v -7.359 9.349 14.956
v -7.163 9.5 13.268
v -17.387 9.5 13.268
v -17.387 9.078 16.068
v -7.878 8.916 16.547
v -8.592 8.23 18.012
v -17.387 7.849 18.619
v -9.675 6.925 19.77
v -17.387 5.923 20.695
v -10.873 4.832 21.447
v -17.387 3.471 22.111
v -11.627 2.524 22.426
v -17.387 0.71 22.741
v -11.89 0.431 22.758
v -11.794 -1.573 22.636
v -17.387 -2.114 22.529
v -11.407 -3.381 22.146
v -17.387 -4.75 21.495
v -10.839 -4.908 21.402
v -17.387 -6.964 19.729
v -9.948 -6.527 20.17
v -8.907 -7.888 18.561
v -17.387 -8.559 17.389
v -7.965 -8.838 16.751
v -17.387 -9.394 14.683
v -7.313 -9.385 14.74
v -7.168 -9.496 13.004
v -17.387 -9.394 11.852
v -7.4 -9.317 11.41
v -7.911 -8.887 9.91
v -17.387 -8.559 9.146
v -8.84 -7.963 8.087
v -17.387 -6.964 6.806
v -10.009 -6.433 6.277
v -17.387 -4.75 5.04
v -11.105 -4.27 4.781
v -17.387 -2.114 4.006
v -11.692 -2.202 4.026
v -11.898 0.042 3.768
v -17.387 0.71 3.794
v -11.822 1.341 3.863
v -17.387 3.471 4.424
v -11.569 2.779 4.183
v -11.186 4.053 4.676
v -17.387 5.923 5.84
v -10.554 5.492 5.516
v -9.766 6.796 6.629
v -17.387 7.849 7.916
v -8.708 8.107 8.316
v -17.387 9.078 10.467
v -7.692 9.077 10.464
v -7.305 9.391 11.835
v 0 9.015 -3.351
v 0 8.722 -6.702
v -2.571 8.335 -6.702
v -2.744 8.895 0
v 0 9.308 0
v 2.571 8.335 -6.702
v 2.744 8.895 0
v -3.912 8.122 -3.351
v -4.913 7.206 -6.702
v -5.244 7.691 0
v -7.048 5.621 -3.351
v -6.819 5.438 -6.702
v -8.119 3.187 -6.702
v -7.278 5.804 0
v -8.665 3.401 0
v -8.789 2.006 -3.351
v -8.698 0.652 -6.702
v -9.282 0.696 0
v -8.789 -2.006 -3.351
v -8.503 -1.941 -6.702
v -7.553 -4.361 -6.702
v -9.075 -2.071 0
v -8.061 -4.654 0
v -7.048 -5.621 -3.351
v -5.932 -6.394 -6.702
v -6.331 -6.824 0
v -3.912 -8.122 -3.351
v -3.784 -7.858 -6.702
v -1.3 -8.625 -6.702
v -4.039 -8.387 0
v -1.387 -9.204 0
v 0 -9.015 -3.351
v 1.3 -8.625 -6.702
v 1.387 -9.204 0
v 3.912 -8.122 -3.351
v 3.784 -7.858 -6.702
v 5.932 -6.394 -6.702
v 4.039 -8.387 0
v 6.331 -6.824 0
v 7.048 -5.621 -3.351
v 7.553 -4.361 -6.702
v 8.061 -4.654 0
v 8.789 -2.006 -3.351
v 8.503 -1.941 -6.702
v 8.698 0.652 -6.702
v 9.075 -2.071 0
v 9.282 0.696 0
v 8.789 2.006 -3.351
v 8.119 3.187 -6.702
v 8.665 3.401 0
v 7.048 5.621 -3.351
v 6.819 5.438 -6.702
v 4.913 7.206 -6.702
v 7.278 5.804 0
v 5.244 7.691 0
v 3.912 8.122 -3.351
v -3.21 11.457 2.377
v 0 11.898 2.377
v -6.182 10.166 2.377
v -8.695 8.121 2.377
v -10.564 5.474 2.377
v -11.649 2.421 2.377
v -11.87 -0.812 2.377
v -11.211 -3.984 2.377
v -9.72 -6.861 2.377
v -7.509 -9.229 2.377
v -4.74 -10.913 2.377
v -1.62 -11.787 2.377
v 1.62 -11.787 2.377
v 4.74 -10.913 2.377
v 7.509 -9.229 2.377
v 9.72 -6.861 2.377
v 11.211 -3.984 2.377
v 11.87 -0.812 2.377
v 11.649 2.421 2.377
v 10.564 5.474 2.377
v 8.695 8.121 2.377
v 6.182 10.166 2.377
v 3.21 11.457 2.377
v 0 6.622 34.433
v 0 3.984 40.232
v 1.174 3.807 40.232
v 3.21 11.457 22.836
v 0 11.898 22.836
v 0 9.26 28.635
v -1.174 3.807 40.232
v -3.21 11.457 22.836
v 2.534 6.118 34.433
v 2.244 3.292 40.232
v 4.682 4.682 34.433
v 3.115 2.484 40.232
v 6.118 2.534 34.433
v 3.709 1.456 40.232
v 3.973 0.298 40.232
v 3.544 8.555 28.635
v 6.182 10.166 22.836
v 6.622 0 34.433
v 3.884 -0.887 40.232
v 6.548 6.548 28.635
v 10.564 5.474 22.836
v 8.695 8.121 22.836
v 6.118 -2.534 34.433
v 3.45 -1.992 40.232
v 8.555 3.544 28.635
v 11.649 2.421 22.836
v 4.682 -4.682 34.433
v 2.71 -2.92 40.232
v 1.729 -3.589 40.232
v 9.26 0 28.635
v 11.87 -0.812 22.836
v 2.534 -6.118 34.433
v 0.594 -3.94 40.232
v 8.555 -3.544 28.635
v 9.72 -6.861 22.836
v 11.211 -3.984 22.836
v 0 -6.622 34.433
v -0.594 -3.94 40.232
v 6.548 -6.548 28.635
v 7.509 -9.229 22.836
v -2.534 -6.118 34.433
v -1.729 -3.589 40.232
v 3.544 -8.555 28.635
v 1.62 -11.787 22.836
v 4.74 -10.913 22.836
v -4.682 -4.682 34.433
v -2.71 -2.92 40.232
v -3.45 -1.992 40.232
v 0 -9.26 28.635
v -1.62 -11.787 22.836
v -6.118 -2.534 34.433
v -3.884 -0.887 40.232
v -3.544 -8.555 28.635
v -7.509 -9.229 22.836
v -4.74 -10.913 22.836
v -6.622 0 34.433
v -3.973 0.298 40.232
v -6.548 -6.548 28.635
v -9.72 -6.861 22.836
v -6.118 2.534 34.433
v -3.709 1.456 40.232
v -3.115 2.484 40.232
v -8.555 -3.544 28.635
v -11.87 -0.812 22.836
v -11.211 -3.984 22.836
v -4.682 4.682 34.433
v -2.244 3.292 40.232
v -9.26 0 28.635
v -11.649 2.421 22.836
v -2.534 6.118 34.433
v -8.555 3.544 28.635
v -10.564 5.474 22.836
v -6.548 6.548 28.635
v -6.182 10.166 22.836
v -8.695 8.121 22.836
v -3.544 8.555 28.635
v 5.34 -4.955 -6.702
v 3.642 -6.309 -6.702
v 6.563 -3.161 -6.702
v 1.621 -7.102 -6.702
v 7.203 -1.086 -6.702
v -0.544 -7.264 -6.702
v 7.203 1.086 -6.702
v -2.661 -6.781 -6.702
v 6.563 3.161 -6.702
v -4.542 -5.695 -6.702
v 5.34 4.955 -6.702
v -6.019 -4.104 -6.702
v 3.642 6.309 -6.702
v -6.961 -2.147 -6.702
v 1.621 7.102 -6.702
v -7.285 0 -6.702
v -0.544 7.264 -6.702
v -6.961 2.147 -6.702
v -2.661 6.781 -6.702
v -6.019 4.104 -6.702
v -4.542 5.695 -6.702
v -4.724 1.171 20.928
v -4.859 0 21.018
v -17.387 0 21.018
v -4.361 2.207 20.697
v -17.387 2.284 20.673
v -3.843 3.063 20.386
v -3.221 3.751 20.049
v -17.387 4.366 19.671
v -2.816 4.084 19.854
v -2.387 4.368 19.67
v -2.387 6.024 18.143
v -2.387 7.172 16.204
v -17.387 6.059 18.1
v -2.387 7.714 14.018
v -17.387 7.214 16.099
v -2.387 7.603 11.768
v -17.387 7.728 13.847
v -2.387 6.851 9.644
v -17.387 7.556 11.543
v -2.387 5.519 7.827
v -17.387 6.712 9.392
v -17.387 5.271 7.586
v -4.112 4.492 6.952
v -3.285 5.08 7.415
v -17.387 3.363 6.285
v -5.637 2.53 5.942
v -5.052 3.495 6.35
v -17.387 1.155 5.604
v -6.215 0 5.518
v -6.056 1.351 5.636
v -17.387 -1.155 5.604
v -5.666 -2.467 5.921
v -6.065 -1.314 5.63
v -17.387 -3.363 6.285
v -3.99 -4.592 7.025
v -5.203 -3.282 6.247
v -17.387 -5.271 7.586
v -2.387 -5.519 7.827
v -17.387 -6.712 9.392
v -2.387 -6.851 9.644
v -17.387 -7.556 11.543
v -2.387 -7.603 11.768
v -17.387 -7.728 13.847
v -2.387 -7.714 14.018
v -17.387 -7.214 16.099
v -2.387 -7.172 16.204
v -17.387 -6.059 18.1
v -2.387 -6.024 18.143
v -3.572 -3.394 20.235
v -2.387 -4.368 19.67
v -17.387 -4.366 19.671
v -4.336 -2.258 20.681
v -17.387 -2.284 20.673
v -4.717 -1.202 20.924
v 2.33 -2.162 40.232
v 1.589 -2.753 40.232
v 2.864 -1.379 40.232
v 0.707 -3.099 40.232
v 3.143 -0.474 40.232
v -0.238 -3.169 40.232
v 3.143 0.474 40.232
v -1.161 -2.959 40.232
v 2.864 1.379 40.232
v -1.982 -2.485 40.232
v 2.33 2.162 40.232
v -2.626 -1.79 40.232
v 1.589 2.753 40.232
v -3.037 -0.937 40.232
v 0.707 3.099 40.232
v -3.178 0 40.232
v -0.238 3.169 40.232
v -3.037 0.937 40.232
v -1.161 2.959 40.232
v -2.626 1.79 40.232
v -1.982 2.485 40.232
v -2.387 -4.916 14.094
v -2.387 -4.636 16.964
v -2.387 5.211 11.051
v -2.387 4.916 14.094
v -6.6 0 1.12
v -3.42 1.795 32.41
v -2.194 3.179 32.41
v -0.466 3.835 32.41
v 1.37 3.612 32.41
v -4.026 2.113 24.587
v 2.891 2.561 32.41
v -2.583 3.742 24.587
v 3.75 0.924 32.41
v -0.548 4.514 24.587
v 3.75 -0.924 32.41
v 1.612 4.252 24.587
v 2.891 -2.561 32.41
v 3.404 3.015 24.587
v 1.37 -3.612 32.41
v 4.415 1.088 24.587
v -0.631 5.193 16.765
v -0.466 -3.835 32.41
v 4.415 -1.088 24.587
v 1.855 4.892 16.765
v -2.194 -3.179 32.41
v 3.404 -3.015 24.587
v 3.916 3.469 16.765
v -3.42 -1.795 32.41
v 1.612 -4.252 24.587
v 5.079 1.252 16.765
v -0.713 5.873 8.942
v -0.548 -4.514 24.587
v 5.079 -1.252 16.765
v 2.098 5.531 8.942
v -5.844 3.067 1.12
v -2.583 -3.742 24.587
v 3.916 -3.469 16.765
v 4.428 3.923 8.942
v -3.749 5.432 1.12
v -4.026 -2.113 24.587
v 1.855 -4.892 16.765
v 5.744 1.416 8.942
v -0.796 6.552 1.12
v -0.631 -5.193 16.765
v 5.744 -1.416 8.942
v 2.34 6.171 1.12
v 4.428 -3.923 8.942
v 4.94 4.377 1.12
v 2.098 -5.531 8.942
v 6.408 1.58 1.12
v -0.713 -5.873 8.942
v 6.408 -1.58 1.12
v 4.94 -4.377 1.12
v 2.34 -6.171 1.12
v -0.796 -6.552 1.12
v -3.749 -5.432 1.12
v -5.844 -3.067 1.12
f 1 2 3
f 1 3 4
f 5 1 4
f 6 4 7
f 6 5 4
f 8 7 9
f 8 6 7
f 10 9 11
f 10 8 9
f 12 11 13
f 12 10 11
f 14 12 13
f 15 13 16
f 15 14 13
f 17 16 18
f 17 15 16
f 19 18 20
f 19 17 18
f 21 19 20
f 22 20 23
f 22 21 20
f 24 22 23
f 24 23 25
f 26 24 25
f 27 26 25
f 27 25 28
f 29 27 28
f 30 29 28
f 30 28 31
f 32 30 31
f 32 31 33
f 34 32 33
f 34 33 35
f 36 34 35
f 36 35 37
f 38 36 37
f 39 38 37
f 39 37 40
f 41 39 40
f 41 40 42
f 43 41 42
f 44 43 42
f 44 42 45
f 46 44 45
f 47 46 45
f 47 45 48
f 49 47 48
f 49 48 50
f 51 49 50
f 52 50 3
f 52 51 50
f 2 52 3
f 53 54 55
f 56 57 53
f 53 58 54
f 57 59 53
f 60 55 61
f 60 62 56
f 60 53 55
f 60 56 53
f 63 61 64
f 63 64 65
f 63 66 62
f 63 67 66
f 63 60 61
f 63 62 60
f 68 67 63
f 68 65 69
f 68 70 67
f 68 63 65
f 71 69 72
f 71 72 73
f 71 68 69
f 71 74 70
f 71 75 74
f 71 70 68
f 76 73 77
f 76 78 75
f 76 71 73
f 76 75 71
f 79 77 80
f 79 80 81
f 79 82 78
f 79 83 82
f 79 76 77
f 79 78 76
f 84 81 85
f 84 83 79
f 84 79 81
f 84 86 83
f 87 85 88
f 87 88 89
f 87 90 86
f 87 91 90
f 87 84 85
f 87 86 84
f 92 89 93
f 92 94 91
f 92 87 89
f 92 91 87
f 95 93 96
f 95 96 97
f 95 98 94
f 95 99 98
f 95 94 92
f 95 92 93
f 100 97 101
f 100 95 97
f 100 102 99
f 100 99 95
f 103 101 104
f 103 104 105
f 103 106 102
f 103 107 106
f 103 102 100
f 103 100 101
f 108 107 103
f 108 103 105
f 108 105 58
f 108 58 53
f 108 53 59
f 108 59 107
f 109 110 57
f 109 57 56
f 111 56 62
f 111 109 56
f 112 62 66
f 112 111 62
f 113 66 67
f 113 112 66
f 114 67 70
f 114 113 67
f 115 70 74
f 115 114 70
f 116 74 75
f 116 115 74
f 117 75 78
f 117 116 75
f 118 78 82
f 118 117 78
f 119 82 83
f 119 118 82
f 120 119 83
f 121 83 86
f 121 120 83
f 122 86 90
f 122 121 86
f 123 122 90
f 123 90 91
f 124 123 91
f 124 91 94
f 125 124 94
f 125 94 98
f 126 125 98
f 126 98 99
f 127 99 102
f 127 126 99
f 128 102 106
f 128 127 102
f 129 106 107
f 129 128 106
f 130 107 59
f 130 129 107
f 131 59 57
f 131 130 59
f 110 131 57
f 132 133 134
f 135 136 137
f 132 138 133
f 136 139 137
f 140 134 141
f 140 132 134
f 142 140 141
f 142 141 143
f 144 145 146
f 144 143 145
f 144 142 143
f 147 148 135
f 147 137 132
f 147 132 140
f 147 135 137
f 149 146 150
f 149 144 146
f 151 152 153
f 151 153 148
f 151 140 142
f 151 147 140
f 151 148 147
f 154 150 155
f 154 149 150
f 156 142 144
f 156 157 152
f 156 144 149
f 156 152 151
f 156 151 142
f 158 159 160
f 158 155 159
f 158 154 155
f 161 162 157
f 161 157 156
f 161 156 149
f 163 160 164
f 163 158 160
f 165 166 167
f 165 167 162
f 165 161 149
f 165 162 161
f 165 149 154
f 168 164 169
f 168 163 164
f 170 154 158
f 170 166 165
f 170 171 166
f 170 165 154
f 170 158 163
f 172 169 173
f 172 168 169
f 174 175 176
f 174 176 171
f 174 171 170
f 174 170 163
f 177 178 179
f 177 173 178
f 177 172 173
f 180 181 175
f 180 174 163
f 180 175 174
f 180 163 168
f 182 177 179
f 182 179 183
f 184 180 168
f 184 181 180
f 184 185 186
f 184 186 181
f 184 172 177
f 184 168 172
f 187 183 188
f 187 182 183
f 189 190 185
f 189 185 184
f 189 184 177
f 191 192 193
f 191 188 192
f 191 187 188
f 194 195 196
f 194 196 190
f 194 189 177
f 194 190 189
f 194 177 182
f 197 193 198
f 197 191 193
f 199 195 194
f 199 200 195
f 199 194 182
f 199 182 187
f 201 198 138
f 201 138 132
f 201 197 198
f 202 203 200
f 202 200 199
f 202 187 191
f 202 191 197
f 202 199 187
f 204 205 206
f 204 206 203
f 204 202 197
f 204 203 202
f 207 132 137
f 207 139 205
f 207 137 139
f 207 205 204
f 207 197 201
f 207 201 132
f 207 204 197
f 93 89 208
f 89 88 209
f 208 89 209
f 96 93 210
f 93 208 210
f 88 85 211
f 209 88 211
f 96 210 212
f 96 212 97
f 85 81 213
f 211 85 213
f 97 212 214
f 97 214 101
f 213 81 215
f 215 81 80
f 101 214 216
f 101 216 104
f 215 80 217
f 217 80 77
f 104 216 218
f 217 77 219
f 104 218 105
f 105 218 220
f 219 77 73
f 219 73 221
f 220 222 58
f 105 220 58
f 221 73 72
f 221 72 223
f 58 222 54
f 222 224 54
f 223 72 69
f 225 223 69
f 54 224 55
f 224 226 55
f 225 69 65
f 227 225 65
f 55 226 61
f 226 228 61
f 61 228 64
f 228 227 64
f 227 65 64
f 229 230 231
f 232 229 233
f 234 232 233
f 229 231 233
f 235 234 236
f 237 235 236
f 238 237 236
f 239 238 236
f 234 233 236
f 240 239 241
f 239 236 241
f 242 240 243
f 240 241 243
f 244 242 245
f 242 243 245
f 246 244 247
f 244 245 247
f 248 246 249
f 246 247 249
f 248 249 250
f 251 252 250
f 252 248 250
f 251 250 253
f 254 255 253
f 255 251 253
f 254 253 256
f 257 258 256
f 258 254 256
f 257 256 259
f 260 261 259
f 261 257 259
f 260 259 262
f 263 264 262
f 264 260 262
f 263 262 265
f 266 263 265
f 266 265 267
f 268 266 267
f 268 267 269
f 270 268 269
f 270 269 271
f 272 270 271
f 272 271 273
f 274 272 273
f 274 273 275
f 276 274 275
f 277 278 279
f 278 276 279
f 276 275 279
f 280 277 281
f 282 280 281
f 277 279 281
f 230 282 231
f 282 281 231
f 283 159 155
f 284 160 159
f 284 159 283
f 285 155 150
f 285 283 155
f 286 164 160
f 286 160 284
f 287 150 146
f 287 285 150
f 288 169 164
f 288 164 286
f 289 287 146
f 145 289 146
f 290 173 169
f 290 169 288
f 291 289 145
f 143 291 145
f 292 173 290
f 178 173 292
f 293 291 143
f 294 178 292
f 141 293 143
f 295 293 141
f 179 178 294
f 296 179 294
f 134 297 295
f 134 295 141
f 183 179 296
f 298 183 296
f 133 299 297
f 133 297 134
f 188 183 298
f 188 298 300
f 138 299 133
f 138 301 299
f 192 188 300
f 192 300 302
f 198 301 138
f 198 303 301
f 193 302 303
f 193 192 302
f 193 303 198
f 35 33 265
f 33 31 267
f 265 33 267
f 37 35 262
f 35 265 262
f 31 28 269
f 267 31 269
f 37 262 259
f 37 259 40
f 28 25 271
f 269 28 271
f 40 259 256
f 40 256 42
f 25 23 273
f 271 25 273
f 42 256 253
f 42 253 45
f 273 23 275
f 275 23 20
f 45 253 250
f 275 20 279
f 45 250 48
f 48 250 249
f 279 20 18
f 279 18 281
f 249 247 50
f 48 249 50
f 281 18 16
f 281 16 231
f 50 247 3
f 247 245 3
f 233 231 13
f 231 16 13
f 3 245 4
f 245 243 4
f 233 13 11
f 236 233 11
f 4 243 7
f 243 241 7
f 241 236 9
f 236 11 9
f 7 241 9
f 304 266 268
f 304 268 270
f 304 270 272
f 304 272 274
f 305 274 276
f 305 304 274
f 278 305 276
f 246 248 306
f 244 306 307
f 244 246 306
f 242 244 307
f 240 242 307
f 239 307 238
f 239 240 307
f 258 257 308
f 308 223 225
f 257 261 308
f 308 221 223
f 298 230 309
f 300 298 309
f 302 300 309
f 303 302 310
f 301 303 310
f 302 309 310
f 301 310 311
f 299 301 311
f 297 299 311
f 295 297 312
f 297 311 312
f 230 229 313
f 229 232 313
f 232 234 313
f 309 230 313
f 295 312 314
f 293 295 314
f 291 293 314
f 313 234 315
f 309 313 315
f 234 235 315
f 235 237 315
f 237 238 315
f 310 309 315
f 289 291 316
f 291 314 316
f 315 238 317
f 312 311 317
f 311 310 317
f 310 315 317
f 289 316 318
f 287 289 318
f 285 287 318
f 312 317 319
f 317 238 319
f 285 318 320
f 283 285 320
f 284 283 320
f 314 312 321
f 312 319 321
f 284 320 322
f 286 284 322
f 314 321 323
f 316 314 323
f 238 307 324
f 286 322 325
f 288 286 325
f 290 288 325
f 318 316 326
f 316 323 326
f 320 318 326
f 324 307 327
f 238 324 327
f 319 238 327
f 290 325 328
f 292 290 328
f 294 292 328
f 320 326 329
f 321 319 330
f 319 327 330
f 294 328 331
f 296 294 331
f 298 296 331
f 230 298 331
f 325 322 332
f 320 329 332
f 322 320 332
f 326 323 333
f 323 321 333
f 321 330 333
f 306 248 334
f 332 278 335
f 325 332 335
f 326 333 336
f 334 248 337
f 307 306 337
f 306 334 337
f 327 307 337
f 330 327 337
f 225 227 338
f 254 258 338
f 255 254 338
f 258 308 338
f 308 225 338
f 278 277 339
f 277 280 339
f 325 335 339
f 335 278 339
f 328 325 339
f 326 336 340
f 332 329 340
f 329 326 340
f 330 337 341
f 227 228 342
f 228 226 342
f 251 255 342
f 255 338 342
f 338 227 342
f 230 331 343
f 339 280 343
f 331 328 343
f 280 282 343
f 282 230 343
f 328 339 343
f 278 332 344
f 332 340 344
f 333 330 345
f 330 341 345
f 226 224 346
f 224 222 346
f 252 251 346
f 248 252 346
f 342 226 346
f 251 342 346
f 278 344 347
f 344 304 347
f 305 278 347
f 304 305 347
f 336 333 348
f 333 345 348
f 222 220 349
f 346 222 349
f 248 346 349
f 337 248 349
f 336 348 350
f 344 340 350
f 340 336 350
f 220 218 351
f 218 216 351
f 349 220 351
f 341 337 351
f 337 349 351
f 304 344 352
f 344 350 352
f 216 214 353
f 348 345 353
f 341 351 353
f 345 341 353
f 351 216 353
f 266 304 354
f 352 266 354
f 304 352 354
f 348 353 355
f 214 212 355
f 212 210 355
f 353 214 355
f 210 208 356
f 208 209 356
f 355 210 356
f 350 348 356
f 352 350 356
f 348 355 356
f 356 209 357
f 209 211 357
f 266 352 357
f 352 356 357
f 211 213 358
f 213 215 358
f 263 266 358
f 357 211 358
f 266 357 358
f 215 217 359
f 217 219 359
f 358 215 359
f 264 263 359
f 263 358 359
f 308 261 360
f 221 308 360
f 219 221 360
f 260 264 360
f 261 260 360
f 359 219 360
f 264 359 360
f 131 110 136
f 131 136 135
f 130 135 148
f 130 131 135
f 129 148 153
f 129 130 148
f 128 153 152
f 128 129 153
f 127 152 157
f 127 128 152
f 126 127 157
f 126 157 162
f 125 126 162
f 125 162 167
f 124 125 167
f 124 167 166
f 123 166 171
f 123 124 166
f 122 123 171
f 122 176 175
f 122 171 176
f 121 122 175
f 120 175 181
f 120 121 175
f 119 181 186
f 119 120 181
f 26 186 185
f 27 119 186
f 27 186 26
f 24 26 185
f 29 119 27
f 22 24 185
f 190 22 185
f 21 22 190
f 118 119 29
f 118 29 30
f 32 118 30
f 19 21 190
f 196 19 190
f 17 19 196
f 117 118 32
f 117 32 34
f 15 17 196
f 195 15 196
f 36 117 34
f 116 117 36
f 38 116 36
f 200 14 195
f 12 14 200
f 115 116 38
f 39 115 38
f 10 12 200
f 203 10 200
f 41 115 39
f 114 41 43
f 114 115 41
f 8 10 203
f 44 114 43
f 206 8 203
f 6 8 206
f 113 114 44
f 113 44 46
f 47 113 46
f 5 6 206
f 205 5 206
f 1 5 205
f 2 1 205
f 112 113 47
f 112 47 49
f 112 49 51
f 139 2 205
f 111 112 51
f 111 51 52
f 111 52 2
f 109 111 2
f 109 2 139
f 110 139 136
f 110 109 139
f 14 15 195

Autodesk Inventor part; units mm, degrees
ref_plane "YZ Plane" through (0, 0, 0) normal (1, 0, 0) x (0, 1, 0)
ref_plane "XZ Plane" through (0, 0, 0) normal (0, 1, 0) x (-1, 0, 0)
sketch "Sketch1" plane through (0, 0, 0) normal (1, 0, 0) x (0, 1, 0)
  line L0 (9.9, 0) -> (6.6104, -37.6)
  line L1 (11, 0) -> (11, -20)
  line L2 (-11, 0) -> (11, 0) projected
  line L3 (8.722, -6.7025) -> (0, -6.7025)
  line L4 (0, -6.7025) -> (0, 40.232)
  line L5 (0, 40.232) -> (3.984, 40.232)
  line L6 (3.984, 40.232) -> (11, 0) construction
  arc A0 (6.0149, 28.5859) -> (5.3277, 32.5264) centre (2.2587, 29.961) ccw construction
  line L7 (3.984, 40.232) -> (11.8979, 22.8363)
  line L8 (11.8979, 22.8363) -> (11.8979, 2.3768)
  line L9 (11.8979, 2.3768) -> (9.3084, 0)
  line L10 (9.3084, 0) -> (8.722, -6.7025)
  point P0 (0, 0)
  dimension "d4" = 4
  dimension "d5" = 4
revolve "Revolution1" add sketch "Sketch1" angle 360 about axis through (0, 0, -6.7025) along (0, 0, 1)
sketch "Sketch2" plane through (0, 0, 0) normal (1, 0, 0) x (0, 1, 0)
  line L0 (-3.984, 40.232) -> (-11.8979, 22.8363) projected
  line L1 (0, 39.9349) -> (0, 14.7253)
  arc A0 (-3.984, 40.232) -> (-3.4864, 41.3256) centre (-5.4716, 41.5688) ccw
  point P0 (0, 0)
  dimension "d7" = 2
sketch "Sketch3" plane through (0, 0, 0) normal (1, 0, 0) x (0, 1, 0)
  circle A0 centre (0, 10) radius 7.21 projected
  circle A1 centre (0, 13.2675) radius 9.5
  point P0 (0, 0)
  dimension "d8" = 19
ref_plane "Work Plane1" through (-17.387, -14.1299, -4.1299) normal (1, 0, 0) x (0, 1, 0)
extrude "Extrusion1" add sketch "Sketch3" against normal up to surface (17.387 mm away) contours A0 A1 | A0 A1 picked at (-1.9464, 7.9731) picked at (-0.0449, 20.8614)
sketch "Sketch4" plane through (-17.387, 0, 13.2675) normal (-1, 0, 0) x (0, 0, 1)
  circle A0 centre (0, 0) radius 9.5 projected
  circle A1 centre (0, 0) radius 7.75
  point P0 (-13.2675, 0)
  dimension "d11" = 15.5
extrude "Extrusion2" cut sketch "Sketch4" against normal blind 15 contours A1
sketch "Sketch5" plane through (0, 0, -6.7025) normal (0, 0, -1) x (-1, 0, 0)
  circle A0 centre (0, 0) radius 9.3084 projected
  circle A1 centre (0, 0) radius 7.2846
  point P0 (0, 0)
extrude "Extrusion3" cut sketch "Sketch5" against normal through all draft -5 contours A1
properties part number "01_Connector_T"
